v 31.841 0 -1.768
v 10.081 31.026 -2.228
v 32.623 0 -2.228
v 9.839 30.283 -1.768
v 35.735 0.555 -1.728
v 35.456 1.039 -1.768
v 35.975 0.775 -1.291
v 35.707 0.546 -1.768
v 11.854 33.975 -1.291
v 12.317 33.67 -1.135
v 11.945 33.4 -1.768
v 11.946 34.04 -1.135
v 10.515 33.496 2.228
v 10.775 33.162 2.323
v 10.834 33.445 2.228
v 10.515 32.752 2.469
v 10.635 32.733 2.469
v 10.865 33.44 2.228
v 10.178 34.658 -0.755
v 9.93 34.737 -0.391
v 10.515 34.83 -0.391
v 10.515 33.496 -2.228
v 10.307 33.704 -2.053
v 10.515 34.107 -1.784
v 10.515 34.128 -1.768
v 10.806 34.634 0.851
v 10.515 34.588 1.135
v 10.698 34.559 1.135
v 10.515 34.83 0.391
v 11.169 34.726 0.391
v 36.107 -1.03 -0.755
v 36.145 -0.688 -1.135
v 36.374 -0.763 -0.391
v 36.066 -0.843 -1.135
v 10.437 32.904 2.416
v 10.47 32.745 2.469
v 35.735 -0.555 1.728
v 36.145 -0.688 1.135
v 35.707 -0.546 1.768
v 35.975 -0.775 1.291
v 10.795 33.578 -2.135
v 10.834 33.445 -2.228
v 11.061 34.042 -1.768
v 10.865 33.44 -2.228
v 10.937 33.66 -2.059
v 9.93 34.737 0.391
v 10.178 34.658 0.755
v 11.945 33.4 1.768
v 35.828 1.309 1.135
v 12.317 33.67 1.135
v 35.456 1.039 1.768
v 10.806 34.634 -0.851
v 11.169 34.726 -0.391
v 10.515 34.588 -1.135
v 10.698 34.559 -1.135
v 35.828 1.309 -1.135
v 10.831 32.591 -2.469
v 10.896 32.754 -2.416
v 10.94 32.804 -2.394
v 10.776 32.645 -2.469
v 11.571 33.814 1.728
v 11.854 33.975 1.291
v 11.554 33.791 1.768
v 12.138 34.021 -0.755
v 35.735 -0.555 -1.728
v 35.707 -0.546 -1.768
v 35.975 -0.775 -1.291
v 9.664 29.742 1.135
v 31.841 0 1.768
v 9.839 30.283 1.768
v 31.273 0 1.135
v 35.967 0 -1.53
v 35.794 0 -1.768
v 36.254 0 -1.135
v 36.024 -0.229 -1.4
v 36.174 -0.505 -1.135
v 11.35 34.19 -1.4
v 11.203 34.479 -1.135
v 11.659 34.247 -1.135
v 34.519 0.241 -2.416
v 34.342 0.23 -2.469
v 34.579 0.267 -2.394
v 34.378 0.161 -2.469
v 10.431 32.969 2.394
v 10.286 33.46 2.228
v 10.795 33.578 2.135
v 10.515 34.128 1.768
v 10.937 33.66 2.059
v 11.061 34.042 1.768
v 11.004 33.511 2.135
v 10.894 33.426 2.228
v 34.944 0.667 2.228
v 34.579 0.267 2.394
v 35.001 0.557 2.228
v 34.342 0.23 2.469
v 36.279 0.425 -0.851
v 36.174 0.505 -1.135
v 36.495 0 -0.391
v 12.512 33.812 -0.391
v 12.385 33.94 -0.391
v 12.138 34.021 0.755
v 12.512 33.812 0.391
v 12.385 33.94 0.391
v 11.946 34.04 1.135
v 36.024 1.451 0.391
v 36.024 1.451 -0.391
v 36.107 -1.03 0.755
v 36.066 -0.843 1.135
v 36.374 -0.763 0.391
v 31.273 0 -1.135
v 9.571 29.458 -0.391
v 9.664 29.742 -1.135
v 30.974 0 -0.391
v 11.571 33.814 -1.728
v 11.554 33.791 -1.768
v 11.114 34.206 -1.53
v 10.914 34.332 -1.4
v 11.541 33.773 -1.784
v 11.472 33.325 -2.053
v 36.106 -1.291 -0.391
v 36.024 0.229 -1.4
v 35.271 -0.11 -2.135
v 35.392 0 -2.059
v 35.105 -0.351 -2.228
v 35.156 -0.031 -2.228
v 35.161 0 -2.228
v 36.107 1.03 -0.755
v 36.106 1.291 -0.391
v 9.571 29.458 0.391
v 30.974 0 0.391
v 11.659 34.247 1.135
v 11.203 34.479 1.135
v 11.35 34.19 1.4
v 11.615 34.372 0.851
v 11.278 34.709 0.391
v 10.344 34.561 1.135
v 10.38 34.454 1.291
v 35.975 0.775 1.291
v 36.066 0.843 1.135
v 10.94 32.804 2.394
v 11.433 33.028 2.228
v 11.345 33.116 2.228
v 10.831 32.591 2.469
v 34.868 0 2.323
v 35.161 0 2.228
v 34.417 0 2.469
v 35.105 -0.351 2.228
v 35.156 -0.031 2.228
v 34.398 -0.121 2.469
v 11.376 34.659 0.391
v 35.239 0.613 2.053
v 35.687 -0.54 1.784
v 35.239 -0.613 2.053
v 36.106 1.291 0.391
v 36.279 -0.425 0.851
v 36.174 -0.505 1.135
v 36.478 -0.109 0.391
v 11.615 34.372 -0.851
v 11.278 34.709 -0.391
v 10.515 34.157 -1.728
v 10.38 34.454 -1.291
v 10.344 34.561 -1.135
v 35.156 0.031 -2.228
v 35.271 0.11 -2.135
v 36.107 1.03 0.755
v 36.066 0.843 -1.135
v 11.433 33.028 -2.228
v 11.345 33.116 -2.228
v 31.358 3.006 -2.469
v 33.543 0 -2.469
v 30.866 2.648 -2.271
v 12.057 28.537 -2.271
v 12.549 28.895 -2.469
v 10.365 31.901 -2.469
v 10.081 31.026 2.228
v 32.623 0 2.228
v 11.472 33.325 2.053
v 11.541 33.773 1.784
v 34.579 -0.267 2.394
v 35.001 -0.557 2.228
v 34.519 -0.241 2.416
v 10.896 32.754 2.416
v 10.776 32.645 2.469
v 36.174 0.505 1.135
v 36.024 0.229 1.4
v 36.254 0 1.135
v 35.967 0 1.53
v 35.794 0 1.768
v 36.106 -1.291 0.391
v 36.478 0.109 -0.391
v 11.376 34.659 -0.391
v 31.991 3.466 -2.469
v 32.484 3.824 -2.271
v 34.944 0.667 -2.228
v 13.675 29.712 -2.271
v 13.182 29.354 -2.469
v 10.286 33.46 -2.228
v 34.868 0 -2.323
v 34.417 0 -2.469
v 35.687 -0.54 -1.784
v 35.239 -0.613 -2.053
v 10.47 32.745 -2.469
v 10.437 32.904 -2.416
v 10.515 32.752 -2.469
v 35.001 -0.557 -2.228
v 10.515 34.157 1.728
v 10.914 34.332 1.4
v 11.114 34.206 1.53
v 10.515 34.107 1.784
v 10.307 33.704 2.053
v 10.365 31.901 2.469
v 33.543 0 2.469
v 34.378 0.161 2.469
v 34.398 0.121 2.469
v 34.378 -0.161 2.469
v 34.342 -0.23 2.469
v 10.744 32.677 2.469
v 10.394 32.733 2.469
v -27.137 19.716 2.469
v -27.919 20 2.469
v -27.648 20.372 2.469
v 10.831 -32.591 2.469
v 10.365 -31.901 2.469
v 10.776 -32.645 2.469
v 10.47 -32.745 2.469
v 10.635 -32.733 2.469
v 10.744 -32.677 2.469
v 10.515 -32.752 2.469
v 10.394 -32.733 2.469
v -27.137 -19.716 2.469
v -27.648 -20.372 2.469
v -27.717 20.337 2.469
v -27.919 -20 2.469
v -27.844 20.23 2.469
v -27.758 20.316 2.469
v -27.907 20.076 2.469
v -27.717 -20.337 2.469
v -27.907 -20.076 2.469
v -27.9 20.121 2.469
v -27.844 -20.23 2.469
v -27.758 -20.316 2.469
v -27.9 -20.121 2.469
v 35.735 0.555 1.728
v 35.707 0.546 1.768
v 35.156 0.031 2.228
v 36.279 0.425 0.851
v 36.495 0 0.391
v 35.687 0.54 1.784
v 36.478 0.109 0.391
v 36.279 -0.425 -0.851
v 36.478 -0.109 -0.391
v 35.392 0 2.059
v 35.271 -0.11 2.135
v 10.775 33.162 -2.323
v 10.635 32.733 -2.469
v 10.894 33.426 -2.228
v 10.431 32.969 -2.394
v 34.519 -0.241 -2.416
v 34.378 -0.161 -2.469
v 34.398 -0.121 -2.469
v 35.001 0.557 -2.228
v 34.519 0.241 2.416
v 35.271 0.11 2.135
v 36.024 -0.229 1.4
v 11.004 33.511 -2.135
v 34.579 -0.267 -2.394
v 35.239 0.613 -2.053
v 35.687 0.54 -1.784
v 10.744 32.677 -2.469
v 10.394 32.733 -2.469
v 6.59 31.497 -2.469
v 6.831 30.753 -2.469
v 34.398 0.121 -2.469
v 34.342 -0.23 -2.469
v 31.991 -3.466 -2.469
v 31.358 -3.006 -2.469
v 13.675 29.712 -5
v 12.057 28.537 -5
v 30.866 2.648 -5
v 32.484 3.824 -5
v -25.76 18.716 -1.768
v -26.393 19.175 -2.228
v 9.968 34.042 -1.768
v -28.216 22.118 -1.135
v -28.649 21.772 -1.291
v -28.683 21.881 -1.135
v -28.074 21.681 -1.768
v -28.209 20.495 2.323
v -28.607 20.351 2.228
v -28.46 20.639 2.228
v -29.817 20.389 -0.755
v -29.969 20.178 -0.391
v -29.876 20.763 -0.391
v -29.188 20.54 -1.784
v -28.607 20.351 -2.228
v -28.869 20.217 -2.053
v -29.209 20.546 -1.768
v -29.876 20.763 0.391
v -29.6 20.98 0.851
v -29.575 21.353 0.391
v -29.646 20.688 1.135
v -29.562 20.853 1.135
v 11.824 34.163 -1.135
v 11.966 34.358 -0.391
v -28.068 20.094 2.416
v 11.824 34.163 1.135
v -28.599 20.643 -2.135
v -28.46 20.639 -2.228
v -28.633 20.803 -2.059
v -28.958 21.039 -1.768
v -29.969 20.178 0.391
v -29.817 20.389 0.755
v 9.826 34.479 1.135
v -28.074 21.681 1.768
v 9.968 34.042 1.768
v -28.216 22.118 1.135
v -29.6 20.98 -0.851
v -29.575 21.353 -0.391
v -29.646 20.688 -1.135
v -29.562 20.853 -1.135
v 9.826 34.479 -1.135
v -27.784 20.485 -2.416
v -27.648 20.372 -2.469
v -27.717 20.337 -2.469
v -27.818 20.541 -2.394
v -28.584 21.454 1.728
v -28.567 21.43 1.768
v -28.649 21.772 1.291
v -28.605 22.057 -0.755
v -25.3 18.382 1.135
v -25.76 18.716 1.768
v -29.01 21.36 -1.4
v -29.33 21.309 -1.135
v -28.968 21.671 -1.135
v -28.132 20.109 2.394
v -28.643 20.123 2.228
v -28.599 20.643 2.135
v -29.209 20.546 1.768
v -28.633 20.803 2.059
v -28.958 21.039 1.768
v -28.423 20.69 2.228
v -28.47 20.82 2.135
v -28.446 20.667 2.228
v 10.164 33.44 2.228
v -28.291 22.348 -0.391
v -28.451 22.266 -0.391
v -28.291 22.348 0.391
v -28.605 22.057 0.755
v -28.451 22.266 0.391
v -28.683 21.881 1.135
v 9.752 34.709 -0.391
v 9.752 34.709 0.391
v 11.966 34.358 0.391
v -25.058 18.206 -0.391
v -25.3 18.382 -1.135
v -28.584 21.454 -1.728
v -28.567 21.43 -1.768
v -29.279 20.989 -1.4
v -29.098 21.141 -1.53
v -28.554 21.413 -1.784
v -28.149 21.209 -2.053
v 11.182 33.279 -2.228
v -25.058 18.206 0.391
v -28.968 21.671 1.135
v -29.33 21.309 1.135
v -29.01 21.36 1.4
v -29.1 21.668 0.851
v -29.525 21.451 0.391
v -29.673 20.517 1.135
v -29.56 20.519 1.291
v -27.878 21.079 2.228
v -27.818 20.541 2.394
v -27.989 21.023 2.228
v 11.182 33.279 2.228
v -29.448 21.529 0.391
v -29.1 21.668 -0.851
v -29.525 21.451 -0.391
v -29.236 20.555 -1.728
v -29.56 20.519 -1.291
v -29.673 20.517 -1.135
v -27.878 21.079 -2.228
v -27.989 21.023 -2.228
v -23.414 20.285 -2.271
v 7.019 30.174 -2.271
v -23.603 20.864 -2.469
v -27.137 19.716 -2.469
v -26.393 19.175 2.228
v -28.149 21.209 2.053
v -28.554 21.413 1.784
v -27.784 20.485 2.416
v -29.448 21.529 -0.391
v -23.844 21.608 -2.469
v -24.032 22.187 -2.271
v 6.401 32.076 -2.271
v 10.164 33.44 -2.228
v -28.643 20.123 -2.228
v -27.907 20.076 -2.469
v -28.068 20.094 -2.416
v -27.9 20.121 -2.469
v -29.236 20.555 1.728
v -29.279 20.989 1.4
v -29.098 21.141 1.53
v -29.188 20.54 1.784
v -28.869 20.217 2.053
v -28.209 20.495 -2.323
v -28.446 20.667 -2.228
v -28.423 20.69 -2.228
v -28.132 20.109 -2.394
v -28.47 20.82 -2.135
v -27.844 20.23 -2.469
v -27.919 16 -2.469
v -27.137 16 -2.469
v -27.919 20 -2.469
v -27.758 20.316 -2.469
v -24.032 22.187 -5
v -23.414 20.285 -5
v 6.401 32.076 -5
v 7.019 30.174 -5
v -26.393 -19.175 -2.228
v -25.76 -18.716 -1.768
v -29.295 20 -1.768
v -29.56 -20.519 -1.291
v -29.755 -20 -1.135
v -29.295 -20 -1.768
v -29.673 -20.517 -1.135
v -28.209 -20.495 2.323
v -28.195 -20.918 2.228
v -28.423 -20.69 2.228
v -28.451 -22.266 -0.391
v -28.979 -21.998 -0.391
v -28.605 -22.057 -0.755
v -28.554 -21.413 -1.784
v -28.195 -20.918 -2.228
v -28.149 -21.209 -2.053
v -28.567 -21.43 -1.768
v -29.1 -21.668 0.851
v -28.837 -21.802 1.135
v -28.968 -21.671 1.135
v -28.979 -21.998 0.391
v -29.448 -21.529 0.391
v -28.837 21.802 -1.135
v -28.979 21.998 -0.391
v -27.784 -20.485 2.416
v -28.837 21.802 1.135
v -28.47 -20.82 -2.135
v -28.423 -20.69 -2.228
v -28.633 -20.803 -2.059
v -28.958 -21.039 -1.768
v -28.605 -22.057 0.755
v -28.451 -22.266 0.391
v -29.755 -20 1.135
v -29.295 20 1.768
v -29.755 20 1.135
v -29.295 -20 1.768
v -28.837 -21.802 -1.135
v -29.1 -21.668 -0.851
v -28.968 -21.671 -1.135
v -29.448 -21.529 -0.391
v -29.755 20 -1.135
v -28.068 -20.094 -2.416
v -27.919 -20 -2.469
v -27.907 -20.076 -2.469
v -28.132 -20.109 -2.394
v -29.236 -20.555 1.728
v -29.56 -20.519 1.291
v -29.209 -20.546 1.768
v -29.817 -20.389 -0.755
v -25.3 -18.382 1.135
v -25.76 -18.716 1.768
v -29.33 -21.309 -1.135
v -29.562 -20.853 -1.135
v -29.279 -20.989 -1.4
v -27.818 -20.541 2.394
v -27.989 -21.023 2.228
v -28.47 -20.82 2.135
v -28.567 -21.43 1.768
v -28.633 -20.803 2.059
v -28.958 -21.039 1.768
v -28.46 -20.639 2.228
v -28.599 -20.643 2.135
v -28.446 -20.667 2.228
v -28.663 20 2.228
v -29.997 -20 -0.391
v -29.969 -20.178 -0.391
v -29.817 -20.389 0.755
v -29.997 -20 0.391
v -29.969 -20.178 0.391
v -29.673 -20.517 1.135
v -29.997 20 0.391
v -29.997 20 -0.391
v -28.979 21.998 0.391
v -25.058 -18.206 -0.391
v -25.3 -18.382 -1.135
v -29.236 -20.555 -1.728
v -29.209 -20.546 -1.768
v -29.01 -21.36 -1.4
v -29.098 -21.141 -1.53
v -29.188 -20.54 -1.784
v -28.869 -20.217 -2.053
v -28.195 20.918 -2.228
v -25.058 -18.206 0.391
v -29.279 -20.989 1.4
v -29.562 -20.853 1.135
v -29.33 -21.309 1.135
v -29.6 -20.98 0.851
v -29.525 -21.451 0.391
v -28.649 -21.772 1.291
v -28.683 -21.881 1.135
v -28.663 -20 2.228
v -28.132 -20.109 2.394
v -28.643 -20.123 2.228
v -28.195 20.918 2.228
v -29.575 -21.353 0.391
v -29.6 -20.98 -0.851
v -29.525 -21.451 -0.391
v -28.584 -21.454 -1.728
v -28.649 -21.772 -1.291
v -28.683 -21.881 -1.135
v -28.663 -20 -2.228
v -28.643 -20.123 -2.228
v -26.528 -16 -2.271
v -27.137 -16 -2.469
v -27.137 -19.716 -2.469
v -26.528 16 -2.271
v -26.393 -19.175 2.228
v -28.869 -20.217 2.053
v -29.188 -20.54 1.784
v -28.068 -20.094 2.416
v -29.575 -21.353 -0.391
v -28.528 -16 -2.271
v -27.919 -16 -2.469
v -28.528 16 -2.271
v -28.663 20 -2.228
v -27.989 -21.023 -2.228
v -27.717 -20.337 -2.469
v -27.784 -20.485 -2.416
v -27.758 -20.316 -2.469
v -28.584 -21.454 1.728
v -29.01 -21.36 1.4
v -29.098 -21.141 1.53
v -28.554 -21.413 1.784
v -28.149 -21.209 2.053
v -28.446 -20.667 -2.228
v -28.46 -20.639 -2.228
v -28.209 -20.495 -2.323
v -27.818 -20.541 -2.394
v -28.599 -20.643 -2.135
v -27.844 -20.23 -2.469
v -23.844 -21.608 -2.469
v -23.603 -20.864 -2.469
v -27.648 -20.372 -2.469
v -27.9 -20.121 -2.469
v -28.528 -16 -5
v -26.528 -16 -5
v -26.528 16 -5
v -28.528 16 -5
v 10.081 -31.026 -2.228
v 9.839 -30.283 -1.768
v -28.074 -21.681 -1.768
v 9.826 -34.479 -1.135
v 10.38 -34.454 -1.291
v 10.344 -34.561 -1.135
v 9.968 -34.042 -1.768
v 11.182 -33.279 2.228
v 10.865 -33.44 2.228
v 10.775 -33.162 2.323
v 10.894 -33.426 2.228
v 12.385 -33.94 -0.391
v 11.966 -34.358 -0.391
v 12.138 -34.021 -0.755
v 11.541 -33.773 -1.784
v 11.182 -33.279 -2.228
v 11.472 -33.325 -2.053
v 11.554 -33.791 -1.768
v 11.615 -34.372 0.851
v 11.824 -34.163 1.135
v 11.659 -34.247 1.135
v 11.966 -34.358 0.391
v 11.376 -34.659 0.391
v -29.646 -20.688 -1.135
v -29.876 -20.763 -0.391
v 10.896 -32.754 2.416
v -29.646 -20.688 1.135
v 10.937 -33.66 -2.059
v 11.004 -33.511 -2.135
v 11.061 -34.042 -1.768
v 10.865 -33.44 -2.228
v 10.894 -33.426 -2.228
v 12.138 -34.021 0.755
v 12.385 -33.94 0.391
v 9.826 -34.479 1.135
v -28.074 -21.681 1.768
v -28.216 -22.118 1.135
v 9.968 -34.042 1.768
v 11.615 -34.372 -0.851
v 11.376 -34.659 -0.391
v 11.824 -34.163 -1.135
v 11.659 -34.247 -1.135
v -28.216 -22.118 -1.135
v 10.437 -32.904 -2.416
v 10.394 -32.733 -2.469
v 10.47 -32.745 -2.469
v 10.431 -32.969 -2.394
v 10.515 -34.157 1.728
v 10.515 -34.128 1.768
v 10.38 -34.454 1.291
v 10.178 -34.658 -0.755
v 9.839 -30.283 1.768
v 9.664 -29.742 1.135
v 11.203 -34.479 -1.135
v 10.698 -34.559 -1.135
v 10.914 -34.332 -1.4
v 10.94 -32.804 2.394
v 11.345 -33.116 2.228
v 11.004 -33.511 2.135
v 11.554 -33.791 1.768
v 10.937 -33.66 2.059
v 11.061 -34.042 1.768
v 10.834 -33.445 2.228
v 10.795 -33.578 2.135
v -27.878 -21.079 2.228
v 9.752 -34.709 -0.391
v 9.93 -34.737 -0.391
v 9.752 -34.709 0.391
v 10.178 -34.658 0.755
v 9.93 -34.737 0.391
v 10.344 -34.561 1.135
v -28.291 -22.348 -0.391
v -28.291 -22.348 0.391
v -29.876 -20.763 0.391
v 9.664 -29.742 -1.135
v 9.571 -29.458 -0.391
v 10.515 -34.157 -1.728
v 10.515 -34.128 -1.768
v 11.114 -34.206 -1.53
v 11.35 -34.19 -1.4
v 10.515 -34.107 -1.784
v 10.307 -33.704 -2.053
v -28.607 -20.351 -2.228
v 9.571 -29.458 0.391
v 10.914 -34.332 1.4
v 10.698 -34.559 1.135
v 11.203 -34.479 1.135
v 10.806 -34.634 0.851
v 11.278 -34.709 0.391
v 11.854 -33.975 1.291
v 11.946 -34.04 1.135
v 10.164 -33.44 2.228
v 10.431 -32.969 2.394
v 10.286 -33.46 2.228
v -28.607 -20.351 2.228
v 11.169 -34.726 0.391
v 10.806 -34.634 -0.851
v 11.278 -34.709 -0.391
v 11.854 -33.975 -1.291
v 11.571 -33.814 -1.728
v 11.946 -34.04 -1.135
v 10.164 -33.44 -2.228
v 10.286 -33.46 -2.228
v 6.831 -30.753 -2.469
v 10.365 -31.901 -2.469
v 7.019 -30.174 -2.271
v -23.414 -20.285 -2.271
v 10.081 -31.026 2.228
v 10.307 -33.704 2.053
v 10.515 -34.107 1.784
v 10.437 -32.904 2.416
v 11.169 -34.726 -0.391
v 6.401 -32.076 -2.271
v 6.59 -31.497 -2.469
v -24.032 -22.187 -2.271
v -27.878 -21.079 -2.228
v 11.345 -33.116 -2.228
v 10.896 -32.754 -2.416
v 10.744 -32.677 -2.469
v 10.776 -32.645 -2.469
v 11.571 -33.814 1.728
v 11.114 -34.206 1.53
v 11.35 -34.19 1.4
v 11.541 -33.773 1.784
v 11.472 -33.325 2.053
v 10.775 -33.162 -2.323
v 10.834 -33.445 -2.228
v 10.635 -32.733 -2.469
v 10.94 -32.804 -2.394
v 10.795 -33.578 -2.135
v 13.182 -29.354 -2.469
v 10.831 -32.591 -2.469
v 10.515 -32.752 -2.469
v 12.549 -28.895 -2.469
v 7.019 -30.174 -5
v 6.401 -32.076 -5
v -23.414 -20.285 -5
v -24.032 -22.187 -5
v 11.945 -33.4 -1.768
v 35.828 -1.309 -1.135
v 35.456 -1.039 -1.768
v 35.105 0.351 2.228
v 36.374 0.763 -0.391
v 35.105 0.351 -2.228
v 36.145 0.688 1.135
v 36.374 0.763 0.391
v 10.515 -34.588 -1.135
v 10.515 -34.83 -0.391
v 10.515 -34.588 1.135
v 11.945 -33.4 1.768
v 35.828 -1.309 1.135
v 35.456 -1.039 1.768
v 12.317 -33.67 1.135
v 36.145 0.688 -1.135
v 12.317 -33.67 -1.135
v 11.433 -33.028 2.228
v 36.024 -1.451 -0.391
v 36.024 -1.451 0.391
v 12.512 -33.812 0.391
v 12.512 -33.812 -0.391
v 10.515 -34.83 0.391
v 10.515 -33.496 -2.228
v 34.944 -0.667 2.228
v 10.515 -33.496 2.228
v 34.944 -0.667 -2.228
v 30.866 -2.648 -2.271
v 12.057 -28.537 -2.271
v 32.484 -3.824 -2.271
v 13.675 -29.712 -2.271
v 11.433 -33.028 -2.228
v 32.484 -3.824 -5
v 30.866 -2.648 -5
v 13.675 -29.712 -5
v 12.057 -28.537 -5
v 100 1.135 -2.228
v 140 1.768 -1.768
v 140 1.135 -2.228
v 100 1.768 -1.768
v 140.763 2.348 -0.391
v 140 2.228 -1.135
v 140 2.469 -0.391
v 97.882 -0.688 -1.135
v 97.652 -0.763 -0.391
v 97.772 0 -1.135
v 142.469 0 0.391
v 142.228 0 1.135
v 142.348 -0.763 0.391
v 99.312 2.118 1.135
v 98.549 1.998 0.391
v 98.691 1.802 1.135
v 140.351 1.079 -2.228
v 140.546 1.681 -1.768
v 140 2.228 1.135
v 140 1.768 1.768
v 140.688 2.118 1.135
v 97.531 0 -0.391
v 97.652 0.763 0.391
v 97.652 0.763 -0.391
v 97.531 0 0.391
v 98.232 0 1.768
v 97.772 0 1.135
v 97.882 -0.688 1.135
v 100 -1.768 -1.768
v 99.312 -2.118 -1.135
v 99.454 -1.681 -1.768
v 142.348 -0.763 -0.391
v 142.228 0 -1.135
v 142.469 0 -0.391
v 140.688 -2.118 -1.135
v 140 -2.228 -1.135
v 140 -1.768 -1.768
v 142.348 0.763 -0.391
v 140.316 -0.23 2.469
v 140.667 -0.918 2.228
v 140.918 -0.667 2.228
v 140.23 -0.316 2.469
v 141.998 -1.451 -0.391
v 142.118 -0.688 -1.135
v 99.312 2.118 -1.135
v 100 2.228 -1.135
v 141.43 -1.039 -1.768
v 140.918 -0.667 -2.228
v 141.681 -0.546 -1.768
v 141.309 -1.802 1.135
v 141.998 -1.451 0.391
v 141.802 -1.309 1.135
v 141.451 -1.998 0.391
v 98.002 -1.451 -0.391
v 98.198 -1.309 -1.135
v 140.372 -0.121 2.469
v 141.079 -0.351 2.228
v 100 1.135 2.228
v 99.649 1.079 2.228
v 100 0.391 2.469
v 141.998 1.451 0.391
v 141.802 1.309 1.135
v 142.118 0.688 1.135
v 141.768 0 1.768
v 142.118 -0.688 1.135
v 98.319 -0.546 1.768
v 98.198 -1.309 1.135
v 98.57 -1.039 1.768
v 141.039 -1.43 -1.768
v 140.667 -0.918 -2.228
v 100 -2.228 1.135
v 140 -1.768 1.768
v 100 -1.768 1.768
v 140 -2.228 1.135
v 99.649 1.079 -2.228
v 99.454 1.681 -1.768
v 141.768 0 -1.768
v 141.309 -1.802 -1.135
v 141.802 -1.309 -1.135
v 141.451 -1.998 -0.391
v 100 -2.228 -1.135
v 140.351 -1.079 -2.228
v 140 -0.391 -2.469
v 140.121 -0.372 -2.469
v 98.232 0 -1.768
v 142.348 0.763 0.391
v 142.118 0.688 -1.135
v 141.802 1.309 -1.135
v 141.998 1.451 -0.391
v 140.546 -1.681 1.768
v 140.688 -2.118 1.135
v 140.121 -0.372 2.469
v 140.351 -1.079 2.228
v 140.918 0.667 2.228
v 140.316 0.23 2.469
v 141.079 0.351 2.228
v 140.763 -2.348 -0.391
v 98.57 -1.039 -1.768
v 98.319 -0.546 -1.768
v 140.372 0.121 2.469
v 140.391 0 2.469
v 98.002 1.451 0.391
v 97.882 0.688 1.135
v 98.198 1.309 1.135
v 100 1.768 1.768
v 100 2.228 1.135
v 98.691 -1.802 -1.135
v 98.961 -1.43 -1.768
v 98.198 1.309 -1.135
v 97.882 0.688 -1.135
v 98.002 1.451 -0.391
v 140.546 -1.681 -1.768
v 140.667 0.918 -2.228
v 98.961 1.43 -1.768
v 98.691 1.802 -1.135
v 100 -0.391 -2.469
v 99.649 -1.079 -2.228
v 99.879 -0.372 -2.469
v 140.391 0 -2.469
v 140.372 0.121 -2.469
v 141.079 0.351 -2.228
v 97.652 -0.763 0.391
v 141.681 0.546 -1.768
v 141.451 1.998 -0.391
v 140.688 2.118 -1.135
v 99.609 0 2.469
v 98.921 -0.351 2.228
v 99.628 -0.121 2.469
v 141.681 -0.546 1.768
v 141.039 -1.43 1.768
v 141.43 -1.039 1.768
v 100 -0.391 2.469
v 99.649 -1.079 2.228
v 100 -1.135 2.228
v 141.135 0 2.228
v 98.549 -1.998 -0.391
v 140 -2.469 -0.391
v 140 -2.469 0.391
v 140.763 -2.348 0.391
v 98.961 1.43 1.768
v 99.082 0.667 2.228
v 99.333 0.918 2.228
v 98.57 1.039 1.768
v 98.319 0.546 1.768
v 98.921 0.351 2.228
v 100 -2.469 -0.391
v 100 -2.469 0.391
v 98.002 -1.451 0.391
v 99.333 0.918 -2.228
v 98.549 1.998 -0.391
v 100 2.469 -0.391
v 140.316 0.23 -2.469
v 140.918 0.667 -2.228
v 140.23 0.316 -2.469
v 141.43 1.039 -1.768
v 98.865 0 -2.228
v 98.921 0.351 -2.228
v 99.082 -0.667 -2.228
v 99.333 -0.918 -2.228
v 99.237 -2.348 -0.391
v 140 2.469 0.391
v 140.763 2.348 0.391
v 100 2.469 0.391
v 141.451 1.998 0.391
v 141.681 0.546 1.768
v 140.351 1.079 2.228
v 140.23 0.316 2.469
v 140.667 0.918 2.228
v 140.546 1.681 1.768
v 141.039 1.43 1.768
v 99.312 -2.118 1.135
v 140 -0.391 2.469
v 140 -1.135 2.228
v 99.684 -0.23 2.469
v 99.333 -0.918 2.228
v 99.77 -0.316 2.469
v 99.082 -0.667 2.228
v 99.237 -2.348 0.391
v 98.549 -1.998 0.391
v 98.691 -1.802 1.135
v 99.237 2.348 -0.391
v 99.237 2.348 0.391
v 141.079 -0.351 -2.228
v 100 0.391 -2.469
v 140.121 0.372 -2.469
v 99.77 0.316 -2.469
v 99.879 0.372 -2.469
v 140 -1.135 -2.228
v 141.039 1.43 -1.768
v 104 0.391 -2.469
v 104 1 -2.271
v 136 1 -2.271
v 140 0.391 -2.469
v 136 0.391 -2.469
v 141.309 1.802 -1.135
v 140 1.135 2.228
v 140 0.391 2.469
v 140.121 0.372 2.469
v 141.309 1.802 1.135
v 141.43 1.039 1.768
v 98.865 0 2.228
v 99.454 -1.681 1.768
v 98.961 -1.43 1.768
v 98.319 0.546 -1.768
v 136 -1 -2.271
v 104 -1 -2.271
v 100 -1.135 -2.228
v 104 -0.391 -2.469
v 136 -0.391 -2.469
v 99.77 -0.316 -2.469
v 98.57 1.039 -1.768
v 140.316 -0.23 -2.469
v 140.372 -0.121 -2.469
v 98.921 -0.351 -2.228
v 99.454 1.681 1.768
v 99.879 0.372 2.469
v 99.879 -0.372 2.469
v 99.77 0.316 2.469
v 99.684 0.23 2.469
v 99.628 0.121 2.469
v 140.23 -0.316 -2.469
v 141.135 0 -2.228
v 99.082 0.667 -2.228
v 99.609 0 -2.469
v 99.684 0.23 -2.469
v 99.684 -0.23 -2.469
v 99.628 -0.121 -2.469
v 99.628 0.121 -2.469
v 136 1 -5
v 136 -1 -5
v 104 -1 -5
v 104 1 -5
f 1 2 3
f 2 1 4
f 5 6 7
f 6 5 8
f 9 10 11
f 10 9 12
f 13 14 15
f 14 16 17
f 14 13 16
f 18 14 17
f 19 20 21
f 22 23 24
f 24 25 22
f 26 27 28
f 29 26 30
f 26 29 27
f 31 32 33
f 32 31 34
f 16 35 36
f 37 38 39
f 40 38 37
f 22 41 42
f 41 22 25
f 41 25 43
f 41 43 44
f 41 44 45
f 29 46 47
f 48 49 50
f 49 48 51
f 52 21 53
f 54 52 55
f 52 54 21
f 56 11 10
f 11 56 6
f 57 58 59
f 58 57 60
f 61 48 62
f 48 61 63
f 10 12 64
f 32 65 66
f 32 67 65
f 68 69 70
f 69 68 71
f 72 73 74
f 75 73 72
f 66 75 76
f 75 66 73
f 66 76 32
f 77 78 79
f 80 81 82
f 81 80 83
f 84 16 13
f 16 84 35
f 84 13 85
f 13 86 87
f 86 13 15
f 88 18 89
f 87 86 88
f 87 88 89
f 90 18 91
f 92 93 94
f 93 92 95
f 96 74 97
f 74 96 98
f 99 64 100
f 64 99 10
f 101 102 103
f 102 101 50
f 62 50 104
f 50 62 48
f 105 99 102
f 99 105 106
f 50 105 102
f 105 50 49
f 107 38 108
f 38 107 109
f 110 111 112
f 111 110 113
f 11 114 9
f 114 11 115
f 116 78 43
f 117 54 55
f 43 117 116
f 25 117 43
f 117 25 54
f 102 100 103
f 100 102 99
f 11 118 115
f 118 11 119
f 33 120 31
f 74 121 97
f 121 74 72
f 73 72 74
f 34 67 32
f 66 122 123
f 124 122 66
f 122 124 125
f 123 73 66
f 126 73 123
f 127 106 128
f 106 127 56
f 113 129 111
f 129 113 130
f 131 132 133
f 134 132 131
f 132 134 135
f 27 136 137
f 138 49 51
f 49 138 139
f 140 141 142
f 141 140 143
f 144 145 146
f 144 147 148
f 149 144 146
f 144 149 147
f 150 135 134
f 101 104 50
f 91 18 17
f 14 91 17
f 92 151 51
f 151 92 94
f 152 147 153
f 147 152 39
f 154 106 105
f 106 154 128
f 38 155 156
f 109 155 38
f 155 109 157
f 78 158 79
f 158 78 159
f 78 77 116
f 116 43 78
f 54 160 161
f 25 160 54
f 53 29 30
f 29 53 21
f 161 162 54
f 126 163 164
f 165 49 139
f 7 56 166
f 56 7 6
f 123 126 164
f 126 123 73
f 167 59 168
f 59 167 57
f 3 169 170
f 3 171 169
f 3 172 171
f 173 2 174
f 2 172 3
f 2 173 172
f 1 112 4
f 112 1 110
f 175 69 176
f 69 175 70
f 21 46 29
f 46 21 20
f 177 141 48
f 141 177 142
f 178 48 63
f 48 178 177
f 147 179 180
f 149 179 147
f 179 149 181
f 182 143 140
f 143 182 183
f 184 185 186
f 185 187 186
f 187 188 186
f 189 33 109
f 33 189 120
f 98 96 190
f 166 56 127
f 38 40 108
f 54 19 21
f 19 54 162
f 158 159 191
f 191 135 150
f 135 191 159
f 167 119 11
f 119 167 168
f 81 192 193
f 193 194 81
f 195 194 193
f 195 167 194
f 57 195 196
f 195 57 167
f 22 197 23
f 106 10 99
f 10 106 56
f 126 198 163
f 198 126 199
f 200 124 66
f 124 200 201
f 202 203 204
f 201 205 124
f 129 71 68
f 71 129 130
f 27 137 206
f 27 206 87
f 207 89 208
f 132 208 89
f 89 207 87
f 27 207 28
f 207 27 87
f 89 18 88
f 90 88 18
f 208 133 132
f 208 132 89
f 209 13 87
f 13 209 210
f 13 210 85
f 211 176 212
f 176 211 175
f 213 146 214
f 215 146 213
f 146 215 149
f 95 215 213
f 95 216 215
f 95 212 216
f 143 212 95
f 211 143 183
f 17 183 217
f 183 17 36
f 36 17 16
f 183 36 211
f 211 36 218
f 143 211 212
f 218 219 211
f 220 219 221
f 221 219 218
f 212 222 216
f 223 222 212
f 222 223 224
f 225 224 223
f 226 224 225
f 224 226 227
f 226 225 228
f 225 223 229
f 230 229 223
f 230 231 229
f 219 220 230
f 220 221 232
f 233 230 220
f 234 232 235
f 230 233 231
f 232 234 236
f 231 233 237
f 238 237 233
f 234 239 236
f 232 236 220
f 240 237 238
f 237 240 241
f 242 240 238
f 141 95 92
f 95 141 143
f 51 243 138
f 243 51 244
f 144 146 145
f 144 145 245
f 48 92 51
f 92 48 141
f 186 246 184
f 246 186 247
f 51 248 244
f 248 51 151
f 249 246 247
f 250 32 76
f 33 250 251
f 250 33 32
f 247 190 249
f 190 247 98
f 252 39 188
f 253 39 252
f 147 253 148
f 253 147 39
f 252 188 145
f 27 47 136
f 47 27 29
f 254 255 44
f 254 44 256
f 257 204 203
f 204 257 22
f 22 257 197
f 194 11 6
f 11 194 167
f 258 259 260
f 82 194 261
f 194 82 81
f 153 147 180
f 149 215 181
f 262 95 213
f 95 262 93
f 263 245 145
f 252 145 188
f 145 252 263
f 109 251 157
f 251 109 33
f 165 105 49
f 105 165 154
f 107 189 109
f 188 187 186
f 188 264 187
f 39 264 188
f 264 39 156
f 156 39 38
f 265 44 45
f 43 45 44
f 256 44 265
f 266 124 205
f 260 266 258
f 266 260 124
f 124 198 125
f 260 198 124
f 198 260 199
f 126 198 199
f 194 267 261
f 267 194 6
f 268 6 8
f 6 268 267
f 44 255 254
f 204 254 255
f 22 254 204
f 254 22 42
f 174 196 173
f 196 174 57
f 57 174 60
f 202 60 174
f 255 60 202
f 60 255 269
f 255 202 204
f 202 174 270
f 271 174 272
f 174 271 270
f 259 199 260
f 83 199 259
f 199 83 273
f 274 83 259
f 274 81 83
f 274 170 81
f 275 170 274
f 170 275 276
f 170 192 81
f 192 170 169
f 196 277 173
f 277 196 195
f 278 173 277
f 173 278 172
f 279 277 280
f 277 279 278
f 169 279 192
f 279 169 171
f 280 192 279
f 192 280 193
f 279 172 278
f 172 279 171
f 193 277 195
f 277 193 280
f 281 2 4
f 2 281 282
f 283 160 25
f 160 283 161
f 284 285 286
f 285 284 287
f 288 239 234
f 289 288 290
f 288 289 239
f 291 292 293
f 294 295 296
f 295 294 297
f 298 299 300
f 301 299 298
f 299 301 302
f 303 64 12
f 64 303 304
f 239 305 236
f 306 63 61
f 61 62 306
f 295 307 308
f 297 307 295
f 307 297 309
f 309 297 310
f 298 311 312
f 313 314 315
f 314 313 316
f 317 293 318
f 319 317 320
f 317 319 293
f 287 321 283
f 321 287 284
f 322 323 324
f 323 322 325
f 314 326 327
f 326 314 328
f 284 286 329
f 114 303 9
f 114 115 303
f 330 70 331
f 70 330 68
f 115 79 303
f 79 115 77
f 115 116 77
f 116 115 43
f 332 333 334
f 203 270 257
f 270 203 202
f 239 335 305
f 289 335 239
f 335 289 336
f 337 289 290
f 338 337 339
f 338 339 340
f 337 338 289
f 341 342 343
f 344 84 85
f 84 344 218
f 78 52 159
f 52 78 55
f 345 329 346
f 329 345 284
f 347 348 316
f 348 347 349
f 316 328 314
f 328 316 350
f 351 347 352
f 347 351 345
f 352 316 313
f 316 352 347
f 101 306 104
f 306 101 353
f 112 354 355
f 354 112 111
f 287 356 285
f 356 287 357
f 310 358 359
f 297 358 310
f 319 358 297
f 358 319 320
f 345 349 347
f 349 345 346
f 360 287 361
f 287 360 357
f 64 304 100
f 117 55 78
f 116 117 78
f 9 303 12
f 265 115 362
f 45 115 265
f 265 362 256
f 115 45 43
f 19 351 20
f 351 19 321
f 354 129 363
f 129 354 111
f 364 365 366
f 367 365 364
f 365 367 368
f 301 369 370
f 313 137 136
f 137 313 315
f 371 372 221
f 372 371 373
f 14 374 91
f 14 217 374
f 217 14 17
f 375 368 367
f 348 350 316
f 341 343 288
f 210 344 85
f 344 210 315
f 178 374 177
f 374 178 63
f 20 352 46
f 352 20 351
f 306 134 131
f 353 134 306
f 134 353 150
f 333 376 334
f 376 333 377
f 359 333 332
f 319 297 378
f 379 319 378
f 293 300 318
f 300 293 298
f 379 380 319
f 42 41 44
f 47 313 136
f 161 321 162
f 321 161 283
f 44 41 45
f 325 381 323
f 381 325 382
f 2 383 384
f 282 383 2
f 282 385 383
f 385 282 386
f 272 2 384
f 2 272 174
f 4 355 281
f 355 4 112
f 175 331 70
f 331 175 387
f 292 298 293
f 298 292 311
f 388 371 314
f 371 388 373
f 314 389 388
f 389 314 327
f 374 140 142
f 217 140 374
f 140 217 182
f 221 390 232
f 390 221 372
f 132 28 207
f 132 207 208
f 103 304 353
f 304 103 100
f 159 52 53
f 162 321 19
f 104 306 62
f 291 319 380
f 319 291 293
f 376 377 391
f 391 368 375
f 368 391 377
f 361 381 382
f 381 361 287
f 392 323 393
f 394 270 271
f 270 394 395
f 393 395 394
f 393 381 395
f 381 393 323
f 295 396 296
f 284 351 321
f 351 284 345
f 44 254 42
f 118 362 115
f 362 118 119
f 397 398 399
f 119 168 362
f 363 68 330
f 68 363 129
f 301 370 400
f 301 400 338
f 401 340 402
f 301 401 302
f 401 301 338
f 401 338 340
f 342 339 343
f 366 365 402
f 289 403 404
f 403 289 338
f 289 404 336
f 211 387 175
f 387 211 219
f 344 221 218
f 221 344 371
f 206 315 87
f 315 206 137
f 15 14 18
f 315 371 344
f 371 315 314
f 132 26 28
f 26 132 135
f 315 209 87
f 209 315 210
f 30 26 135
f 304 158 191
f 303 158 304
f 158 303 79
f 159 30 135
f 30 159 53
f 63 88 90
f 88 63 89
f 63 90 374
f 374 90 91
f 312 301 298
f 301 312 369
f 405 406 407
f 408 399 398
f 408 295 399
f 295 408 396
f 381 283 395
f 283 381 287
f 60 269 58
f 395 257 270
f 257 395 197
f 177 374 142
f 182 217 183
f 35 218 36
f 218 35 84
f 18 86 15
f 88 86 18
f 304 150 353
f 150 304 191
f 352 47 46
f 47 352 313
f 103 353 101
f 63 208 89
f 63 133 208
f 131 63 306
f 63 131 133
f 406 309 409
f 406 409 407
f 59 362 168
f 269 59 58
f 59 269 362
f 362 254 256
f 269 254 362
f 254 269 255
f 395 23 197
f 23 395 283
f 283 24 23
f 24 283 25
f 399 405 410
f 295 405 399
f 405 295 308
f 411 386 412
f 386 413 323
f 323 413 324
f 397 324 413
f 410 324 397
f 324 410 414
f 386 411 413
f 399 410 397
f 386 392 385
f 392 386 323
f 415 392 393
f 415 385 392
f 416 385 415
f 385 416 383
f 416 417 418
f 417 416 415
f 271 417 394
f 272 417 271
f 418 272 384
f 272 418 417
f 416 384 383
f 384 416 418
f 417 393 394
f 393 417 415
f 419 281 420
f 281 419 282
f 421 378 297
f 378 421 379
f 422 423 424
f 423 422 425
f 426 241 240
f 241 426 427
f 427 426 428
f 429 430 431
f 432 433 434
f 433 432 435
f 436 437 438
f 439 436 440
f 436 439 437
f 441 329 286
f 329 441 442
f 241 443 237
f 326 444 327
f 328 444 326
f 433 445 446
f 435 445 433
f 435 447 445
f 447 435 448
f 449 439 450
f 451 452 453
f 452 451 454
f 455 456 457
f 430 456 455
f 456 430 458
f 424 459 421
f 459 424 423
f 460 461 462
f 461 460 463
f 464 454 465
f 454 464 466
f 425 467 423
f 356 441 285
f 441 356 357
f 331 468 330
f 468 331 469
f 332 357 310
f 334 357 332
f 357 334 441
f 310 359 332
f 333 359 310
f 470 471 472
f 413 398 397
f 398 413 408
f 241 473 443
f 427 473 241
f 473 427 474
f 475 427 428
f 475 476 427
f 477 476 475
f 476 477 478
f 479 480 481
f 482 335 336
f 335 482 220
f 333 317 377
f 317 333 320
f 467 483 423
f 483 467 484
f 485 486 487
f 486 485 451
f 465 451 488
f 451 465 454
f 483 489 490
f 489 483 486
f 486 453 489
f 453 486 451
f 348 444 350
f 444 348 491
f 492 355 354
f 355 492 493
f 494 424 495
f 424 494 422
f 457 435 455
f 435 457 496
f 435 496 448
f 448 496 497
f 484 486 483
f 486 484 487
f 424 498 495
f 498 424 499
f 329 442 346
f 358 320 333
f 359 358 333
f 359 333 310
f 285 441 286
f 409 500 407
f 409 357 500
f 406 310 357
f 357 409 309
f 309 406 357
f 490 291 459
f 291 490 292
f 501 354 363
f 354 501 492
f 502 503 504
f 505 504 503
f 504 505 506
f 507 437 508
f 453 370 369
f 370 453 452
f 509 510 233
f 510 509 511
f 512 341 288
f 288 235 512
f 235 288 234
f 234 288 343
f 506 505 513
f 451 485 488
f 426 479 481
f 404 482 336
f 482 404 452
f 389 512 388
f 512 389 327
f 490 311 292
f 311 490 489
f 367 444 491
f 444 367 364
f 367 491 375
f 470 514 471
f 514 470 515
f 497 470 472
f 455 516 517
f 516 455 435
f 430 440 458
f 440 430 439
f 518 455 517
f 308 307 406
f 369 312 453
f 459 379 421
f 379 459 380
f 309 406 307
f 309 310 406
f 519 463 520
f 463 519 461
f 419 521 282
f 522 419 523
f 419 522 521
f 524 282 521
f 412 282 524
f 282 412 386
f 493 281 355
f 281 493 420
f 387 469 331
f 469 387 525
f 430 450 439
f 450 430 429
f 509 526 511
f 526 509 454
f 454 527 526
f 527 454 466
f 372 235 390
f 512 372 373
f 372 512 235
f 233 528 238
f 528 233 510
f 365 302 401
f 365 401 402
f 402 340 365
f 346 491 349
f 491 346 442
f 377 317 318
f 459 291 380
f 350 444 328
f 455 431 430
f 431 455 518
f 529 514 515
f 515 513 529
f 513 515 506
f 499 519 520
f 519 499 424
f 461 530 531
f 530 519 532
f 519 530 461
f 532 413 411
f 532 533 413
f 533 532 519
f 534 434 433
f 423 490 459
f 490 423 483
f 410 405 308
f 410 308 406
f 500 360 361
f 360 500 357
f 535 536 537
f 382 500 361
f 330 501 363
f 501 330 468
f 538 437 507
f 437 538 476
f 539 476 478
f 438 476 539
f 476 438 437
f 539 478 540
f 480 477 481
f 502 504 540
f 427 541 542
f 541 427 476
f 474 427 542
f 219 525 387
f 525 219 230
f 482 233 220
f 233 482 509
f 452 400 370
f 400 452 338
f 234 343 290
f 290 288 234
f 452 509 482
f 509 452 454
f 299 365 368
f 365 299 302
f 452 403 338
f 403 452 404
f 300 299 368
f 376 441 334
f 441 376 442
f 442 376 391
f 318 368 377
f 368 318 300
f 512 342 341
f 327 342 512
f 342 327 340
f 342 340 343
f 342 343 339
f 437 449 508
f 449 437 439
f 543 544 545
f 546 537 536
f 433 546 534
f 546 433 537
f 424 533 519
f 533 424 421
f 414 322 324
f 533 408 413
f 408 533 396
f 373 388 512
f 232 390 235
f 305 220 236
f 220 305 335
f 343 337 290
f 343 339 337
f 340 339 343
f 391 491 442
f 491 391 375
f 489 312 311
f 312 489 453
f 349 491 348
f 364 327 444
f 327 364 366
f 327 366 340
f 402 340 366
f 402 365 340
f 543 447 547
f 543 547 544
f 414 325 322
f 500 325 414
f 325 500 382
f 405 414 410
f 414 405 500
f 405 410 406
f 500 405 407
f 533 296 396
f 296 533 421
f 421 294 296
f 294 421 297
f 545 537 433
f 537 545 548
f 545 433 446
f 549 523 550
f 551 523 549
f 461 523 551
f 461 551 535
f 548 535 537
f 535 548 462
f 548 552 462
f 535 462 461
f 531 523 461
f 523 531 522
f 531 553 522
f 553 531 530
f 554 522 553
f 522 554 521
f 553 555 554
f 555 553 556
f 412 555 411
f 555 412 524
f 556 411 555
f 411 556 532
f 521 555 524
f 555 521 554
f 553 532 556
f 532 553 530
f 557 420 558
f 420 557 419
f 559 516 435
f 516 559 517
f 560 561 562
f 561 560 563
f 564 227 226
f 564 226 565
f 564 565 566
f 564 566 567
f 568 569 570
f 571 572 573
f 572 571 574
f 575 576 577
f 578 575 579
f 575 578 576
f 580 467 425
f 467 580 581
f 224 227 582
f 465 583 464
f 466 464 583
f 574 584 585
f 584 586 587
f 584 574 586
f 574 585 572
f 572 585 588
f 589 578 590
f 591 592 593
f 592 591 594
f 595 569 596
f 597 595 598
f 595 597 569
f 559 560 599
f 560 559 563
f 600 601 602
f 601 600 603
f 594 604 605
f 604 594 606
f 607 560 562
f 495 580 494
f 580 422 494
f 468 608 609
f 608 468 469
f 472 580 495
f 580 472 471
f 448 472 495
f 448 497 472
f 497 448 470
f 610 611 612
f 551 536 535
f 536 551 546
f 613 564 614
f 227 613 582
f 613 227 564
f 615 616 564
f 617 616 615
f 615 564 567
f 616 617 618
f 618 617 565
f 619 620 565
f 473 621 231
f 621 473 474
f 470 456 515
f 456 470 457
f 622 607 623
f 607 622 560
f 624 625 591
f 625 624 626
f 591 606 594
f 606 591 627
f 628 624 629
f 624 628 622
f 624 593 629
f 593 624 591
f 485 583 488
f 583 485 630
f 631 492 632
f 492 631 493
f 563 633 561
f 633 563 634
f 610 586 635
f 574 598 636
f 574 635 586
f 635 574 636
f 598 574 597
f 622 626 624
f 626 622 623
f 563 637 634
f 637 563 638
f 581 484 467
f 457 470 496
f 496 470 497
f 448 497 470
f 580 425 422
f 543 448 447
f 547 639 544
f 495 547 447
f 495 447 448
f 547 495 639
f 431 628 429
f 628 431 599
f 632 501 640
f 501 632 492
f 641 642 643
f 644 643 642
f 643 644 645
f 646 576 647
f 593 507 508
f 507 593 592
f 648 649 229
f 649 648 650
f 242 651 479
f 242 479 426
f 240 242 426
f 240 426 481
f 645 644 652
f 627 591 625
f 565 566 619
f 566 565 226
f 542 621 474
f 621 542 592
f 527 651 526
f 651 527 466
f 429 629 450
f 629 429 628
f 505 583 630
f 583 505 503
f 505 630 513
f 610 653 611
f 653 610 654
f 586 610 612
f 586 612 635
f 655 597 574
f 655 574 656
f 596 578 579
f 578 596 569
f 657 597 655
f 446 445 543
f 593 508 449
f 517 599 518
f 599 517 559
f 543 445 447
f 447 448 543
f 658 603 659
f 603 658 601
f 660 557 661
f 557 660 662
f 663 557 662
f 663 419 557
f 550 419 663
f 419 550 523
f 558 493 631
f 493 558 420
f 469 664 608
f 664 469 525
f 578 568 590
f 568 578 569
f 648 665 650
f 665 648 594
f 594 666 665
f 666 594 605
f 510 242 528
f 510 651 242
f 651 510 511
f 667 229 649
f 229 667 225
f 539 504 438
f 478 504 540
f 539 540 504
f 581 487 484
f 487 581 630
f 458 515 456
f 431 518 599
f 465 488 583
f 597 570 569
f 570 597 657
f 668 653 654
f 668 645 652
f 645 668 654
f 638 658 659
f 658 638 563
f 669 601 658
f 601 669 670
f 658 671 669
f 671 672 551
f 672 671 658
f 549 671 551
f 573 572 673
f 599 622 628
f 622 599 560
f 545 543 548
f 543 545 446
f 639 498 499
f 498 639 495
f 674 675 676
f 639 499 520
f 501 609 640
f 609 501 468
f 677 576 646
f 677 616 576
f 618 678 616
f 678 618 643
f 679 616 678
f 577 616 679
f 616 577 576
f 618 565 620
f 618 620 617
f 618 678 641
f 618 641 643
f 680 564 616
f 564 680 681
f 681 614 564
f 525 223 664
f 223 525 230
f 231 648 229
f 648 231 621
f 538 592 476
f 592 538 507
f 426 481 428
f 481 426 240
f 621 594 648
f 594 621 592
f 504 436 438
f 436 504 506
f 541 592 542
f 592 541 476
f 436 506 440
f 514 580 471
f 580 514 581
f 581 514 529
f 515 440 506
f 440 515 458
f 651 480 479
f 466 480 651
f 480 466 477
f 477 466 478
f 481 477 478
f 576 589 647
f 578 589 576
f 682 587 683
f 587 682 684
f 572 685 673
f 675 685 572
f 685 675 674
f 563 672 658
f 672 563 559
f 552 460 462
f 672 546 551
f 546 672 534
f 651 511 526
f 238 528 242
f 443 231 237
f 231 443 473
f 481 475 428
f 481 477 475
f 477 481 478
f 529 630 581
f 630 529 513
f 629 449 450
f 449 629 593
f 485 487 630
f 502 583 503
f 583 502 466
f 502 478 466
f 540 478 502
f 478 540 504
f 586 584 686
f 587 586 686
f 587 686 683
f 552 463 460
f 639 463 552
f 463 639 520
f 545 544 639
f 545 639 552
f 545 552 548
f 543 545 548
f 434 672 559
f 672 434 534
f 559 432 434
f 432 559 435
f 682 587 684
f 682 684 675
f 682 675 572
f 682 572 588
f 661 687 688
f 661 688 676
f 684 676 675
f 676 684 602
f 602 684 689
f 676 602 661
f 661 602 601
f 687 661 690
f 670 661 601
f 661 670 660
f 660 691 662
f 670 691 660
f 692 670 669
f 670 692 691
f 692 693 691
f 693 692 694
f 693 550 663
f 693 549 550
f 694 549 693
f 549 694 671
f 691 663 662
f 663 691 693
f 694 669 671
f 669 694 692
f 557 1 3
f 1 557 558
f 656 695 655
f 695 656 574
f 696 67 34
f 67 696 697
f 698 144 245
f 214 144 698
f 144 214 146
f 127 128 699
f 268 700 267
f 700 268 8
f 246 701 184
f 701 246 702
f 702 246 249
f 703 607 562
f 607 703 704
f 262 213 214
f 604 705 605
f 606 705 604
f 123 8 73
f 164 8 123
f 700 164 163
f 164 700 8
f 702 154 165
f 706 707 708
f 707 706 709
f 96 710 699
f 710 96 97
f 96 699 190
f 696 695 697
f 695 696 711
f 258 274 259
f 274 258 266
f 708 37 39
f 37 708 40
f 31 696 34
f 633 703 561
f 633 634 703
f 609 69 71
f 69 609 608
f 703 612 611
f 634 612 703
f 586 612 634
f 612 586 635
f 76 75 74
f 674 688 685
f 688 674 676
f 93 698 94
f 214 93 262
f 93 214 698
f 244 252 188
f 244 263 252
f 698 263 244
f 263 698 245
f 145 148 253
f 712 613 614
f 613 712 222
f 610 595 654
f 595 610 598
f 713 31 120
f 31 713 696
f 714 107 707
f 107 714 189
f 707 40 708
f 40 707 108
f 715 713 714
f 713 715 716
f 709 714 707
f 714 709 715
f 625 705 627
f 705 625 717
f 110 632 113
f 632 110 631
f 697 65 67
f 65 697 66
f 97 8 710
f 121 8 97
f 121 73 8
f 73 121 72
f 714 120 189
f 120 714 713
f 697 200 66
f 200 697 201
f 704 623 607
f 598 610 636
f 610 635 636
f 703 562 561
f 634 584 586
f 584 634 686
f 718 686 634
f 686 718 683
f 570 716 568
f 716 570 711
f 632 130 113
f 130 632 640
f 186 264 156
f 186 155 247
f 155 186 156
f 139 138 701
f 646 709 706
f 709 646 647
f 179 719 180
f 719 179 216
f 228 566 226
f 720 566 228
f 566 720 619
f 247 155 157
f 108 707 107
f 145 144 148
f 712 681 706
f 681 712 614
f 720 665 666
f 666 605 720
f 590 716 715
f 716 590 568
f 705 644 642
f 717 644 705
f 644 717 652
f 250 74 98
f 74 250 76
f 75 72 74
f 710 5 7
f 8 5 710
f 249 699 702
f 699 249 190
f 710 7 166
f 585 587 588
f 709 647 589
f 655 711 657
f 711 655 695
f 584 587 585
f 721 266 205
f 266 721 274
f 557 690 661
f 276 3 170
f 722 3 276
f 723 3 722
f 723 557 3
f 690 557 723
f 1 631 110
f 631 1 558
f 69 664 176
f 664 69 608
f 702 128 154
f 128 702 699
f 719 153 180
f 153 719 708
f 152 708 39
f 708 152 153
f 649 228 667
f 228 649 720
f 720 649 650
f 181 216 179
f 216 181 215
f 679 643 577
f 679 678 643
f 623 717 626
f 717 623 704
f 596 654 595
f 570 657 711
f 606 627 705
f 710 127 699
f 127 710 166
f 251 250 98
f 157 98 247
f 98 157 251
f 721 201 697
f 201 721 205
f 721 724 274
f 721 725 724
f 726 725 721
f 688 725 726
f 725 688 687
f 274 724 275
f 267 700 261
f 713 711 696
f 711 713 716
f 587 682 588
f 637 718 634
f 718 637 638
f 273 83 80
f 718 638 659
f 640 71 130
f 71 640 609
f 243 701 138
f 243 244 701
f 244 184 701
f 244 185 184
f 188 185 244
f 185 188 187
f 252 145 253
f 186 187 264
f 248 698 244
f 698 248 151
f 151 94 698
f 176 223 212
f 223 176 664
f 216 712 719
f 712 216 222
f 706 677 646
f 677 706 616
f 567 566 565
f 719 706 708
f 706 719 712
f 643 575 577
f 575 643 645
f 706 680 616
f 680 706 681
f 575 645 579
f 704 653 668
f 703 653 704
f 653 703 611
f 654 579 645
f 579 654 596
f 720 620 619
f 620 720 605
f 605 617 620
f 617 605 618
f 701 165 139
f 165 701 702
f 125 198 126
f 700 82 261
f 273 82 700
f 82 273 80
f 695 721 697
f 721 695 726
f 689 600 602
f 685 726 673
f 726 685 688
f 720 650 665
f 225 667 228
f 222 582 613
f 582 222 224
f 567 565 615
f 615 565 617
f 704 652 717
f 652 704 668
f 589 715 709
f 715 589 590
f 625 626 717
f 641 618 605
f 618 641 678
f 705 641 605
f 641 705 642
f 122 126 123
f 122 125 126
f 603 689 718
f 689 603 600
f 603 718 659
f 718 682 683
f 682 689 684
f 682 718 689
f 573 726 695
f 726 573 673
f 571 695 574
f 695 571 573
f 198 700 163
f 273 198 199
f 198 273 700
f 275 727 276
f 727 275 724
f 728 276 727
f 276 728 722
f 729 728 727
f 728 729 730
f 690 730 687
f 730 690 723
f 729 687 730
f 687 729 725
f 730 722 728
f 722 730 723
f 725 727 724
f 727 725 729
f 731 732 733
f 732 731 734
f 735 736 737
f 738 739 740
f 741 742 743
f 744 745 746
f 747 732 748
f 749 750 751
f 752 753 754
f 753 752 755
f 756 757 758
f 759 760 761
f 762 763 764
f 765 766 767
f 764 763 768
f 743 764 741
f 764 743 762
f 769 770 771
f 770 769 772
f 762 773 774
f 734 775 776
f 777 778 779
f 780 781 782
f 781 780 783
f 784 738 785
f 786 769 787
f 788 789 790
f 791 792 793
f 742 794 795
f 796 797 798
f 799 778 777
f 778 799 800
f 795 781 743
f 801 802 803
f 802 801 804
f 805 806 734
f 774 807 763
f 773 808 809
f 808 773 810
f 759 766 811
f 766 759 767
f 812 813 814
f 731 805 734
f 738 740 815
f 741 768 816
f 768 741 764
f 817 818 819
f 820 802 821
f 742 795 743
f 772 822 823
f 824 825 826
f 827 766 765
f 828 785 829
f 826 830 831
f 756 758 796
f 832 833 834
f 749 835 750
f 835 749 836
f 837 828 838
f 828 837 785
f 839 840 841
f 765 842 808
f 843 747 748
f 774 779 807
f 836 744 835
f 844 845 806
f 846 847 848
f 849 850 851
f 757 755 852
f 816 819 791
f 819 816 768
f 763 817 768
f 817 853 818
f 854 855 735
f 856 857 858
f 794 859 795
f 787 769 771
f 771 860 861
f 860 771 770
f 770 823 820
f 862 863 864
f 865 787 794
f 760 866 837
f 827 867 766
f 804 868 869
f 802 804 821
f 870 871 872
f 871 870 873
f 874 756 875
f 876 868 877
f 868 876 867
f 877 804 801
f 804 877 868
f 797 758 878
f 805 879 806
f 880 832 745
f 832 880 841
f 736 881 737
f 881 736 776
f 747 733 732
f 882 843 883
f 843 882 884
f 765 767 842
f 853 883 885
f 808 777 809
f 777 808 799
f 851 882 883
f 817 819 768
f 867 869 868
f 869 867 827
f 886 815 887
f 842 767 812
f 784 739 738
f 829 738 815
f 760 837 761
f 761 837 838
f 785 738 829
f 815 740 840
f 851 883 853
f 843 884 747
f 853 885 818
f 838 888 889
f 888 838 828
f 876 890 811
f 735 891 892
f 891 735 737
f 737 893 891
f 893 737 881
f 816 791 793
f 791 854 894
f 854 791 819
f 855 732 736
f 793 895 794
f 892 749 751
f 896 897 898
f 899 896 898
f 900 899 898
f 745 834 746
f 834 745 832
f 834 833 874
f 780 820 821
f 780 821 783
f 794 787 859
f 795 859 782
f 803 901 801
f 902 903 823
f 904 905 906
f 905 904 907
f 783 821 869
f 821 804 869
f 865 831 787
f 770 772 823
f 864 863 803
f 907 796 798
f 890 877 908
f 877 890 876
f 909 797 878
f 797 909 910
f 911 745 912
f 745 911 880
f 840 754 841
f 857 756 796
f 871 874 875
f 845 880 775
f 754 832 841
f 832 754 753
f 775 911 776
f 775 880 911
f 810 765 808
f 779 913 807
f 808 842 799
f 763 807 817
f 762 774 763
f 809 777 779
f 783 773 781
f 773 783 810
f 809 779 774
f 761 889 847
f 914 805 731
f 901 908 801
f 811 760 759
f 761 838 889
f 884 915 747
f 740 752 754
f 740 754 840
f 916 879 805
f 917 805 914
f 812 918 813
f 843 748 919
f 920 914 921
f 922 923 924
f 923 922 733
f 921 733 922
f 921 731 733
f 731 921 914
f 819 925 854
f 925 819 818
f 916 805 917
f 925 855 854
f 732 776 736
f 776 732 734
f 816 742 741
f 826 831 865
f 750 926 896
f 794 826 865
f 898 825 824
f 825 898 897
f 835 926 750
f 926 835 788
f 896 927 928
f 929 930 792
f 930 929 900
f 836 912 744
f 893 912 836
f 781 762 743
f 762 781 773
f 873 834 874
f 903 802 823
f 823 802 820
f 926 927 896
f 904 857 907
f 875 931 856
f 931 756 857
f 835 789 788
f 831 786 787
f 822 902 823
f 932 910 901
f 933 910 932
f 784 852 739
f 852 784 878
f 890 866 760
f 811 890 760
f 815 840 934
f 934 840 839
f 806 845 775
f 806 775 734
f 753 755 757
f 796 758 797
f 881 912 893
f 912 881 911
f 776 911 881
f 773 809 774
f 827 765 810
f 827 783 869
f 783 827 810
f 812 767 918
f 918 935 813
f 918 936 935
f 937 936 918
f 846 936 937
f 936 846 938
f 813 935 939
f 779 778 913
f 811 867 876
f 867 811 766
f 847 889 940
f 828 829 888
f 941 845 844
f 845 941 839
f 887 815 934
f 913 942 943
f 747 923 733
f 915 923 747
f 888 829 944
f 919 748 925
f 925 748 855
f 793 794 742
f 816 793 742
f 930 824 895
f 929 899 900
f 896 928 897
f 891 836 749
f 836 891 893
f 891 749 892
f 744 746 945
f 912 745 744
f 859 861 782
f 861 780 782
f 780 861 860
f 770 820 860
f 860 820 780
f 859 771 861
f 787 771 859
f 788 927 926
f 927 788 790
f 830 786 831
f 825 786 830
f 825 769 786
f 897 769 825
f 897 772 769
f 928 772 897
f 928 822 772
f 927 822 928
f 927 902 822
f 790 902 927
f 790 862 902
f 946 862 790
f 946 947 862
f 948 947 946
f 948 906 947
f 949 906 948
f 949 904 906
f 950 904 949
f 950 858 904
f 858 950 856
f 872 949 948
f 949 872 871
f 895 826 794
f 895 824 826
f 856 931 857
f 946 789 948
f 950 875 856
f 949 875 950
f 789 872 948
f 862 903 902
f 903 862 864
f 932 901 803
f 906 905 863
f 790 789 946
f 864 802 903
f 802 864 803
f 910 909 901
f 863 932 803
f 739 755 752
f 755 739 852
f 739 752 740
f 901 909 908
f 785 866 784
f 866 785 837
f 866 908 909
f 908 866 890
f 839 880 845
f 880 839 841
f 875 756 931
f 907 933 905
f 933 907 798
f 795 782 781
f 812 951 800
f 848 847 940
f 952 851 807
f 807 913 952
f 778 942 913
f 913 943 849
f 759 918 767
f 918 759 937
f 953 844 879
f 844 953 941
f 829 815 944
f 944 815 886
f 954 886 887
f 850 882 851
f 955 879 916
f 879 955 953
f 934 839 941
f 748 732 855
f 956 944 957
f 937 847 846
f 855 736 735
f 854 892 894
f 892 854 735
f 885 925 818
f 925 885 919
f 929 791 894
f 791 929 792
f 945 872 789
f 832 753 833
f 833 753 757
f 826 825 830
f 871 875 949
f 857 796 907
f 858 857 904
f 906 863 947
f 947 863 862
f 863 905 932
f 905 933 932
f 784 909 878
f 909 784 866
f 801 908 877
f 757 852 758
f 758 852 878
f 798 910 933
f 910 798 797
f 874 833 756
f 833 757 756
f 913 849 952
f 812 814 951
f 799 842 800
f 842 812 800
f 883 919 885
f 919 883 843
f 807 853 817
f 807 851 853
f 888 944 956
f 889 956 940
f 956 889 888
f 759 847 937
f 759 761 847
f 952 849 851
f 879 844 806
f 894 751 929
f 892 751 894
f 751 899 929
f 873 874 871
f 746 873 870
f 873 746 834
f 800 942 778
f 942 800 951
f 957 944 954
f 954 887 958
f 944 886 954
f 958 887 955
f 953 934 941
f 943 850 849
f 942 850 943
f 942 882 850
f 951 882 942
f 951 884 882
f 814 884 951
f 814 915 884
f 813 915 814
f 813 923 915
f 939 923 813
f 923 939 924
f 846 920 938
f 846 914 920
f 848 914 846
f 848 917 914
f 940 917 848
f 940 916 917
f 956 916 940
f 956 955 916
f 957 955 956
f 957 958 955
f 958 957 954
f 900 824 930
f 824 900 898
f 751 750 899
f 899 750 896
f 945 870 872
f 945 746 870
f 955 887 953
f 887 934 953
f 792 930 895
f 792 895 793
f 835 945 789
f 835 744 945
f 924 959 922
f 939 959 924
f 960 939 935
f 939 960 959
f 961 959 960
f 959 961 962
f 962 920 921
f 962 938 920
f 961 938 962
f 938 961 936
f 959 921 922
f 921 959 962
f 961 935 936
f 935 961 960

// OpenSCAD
// file: polygon-sym.scad
use <../../core/funcs.scad>

/**
Applies polygonal symmetry to the supplied children in the X-Y plane. The child objects are repeated to create an instance per vertex and rotating each so their X-axis points along the edge. 
*/
module apply_polygon_sym(n_vertex, polygon_rad) {
    rot_angle = 360 / n_vertex;
    turn_angle = 90 + rot_angle / 2; 
    for (i = [0: n_vertex-1]) {
        $pgn_edge_idx = i;
        rotate([0, 0, rot_angle * i]) {
            translate([polygon_rad, 0, 0]) {
                rotate([0, 0, turn_angle]) {
                    children();
                }
            }
        }
    }
}


module regular_polygon_2d(n_vertex, edge_len) {
    polygon_rad = calc_radius(n_vertex, edge_len);
    hull() {
        apply_polygon_sym(n_vertex, polygon_rad) {
            square(0.001);
        } 
    }
}

regular_polygon_2d(5, 20);
// file: ../../core/funcs.scad
// ---------------------------------------------------------------------------
// PolySymmetrica - Polyhedral Geometry Engine
// Version: 0.1.0
// Copyright 2025 Susan Witts
// SPDX-License-Identifier: MIT


///////////////////////////////////////
// ---- Poly descriptor accessors ----
function poly_verts(poly)      = poly[0];
function poly_faces(poly)      = poly[1];
function poly_unit_edge(poly)  = poly[2];
function poly_e_over_ir(poly)  = poly[3];


///////////////////////////////////////
// Handy vector functions (and aliases)

function v_add(a, b)   = a + b;
function v_sub(a, b)   = a - b;
function v_scale(a, k) = a * k;             // scalar multiplication
function v_dot(a, b)   = a * b;             // dot product
function v_cross(a, b) = cross(a, b);       // OpenSCAD built-in
function v_len(a)      = norm(a);           // built-in length
function v_norm(a)     = let(L = norm(a)) (L == 0 ? [0,0,0] : a / L);

// Edge equality
function edge_equal(e1, e2) = (e1[0] == e2[0] && e1[1] == e2[1]);

/** Sum of vector */
function sum(a, i = 0) = 
    i >= len(a) ? 0 : a[i] + sum(a, i + 1);

/** Sum of vector list (3D) */
function v_sum(list) = [
    sum([for (v = list) v[0]]),
    sum([for (v = list) v[1]]),
    sum([for (v = list) v[2]])
];

///////////////////////////////////////
// Polygon helpers

/** Calculate polygon edge, given N and radius */ 
function calc_edge(n_vertex, rad) = 2 * rad * sin(180 / n_vertex);

/** Calculate polygon radius, given N and edge length */ 
function calc_radius(n_vertex, edge_len) = edge_len / (2 * sin(180 / n_vertex));

    

///////////////////////////////////////
// Geometry helpers

/** Face centroid from verts + index list */
function face_centroid(verts, f) =
    len(f) == 0
        ? [0,0,0]
        : v_scale(v_sum([for (vid = f) verts[vid]]), 1 / len(f));

// Face normal (not scaled, just direction)
function face_normal(verts, f) =
    v_norm(v_cross(
        verts[f[1]] - verts[f[0]],
        verts[f[2]] - verts[f[0]]
    ));
    

// Return index of some neighbour vertex of vi (from the face list)
function poly_vertex_neighbor(poly, vi) =
    let(
        faces = poly_faces(poly),
        // collect "next" vertex after vi in any face that contains it
        candidates = [
            for (f = faces)
                for (k = [0 : len(f)-1])
                    if (f[k] == vi) f[(k+1) % len(f)]
        ]
    ) candidates[0];  // first one is enough




// ---- Generic face-frame helpers ----
function poly_face_center(poly, fi, scale) =
    let(
        f   = poly_faces(poly)[fi],
        vs  = poly_verts(poly),
        xs  = [ for (vid = f) vs[vid][0] * scale ],
        ys  = [ for (vid = f) vs[vid][1] * scale ],
        zs  = [ for (vid = f) vs[vid][2] * scale ]
    )
    [
        sum(xs) / len(f),
        sum(ys) / len(f),
        sum(zs) / len(f)
    ];


function poly_face_ex(poly, fi, scale) =
    let(f      = poly_faces(poly)[fi],
        vs     = poly_verts(poly),
        center = poly_face_center(poly, fi, scale),
        v0     = vs[f[0]] * scale)
    v_norm(v0 - center);   // local +X points to vertex 0


function poly_face_ey(poly, fi, scale) =
    v_cross(
        poly_face_ez(poly, fi, scale),
        poly_face_ex(poly, fi, scale)
    );


function poly_face_ez(poly, fi, scale) =
    let(f  = poly_faces(poly)[fi],
        vs = poly_verts(poly),
        v0 = vs[f[0]] * scale,
        v1 = vs[f[1]] * scale,
        v2 = vs[f[2]] * scale)
    v_norm(v_cross(v1 - v0, v2 - v0));   // outward normal


function frame_matrix(center, ex, ey, ez) = [
    [ex[0], ey[0], ez[0], center[0]],
    [ex[1], ey[1], ez[1], center[1]],
    [ex[2], ey[2], ez[2], center[2]],
    [0,      0,     0,     1]
];


        
// main file
use <../../core/funcs.scad>
use <polygon-sym.scad>

EDGE_DIAM = 5;
EDGE_KEEL = 5;
EDGE_KEEL_T = 2;

$fn = 20;


module edge_mount(len, edge_diam = EDGE_DIAM) {
    hull() {
        sphere(d = edge_diam);
        translate([len, 0, 0]) sphere(d = edge_diam);
    }
    translate([EDGE_KEEL-1, -EDGE_KEEL_T/2, -EDGE_KEEL]) 
        cube([len-EDGE_KEEL*2+2, EDGE_KEEL_T, EDGE_KEEL]);
}

module regular_polygon_frame(n_vertex, edge_len) {
    polygon_rad = calc_radius(n_vertex, edge_len);
    apply_polygon_sym(n_vertex, polygon_rad) {
        edge_mount(edge_len);
    } 
}

module regular_polygon_2d(n_vertex, edge_len) {
    polygon_rad = calc_radius(n_vertex, edge_len);
    circle(r = polygon_rad, $fn = n_vertex);
}

regular_polygon_frame(5, 40);

translate([0,0,0]) regular_polygon_2d(5, 40);

translate([100,0,0]) edge_mount(40);
